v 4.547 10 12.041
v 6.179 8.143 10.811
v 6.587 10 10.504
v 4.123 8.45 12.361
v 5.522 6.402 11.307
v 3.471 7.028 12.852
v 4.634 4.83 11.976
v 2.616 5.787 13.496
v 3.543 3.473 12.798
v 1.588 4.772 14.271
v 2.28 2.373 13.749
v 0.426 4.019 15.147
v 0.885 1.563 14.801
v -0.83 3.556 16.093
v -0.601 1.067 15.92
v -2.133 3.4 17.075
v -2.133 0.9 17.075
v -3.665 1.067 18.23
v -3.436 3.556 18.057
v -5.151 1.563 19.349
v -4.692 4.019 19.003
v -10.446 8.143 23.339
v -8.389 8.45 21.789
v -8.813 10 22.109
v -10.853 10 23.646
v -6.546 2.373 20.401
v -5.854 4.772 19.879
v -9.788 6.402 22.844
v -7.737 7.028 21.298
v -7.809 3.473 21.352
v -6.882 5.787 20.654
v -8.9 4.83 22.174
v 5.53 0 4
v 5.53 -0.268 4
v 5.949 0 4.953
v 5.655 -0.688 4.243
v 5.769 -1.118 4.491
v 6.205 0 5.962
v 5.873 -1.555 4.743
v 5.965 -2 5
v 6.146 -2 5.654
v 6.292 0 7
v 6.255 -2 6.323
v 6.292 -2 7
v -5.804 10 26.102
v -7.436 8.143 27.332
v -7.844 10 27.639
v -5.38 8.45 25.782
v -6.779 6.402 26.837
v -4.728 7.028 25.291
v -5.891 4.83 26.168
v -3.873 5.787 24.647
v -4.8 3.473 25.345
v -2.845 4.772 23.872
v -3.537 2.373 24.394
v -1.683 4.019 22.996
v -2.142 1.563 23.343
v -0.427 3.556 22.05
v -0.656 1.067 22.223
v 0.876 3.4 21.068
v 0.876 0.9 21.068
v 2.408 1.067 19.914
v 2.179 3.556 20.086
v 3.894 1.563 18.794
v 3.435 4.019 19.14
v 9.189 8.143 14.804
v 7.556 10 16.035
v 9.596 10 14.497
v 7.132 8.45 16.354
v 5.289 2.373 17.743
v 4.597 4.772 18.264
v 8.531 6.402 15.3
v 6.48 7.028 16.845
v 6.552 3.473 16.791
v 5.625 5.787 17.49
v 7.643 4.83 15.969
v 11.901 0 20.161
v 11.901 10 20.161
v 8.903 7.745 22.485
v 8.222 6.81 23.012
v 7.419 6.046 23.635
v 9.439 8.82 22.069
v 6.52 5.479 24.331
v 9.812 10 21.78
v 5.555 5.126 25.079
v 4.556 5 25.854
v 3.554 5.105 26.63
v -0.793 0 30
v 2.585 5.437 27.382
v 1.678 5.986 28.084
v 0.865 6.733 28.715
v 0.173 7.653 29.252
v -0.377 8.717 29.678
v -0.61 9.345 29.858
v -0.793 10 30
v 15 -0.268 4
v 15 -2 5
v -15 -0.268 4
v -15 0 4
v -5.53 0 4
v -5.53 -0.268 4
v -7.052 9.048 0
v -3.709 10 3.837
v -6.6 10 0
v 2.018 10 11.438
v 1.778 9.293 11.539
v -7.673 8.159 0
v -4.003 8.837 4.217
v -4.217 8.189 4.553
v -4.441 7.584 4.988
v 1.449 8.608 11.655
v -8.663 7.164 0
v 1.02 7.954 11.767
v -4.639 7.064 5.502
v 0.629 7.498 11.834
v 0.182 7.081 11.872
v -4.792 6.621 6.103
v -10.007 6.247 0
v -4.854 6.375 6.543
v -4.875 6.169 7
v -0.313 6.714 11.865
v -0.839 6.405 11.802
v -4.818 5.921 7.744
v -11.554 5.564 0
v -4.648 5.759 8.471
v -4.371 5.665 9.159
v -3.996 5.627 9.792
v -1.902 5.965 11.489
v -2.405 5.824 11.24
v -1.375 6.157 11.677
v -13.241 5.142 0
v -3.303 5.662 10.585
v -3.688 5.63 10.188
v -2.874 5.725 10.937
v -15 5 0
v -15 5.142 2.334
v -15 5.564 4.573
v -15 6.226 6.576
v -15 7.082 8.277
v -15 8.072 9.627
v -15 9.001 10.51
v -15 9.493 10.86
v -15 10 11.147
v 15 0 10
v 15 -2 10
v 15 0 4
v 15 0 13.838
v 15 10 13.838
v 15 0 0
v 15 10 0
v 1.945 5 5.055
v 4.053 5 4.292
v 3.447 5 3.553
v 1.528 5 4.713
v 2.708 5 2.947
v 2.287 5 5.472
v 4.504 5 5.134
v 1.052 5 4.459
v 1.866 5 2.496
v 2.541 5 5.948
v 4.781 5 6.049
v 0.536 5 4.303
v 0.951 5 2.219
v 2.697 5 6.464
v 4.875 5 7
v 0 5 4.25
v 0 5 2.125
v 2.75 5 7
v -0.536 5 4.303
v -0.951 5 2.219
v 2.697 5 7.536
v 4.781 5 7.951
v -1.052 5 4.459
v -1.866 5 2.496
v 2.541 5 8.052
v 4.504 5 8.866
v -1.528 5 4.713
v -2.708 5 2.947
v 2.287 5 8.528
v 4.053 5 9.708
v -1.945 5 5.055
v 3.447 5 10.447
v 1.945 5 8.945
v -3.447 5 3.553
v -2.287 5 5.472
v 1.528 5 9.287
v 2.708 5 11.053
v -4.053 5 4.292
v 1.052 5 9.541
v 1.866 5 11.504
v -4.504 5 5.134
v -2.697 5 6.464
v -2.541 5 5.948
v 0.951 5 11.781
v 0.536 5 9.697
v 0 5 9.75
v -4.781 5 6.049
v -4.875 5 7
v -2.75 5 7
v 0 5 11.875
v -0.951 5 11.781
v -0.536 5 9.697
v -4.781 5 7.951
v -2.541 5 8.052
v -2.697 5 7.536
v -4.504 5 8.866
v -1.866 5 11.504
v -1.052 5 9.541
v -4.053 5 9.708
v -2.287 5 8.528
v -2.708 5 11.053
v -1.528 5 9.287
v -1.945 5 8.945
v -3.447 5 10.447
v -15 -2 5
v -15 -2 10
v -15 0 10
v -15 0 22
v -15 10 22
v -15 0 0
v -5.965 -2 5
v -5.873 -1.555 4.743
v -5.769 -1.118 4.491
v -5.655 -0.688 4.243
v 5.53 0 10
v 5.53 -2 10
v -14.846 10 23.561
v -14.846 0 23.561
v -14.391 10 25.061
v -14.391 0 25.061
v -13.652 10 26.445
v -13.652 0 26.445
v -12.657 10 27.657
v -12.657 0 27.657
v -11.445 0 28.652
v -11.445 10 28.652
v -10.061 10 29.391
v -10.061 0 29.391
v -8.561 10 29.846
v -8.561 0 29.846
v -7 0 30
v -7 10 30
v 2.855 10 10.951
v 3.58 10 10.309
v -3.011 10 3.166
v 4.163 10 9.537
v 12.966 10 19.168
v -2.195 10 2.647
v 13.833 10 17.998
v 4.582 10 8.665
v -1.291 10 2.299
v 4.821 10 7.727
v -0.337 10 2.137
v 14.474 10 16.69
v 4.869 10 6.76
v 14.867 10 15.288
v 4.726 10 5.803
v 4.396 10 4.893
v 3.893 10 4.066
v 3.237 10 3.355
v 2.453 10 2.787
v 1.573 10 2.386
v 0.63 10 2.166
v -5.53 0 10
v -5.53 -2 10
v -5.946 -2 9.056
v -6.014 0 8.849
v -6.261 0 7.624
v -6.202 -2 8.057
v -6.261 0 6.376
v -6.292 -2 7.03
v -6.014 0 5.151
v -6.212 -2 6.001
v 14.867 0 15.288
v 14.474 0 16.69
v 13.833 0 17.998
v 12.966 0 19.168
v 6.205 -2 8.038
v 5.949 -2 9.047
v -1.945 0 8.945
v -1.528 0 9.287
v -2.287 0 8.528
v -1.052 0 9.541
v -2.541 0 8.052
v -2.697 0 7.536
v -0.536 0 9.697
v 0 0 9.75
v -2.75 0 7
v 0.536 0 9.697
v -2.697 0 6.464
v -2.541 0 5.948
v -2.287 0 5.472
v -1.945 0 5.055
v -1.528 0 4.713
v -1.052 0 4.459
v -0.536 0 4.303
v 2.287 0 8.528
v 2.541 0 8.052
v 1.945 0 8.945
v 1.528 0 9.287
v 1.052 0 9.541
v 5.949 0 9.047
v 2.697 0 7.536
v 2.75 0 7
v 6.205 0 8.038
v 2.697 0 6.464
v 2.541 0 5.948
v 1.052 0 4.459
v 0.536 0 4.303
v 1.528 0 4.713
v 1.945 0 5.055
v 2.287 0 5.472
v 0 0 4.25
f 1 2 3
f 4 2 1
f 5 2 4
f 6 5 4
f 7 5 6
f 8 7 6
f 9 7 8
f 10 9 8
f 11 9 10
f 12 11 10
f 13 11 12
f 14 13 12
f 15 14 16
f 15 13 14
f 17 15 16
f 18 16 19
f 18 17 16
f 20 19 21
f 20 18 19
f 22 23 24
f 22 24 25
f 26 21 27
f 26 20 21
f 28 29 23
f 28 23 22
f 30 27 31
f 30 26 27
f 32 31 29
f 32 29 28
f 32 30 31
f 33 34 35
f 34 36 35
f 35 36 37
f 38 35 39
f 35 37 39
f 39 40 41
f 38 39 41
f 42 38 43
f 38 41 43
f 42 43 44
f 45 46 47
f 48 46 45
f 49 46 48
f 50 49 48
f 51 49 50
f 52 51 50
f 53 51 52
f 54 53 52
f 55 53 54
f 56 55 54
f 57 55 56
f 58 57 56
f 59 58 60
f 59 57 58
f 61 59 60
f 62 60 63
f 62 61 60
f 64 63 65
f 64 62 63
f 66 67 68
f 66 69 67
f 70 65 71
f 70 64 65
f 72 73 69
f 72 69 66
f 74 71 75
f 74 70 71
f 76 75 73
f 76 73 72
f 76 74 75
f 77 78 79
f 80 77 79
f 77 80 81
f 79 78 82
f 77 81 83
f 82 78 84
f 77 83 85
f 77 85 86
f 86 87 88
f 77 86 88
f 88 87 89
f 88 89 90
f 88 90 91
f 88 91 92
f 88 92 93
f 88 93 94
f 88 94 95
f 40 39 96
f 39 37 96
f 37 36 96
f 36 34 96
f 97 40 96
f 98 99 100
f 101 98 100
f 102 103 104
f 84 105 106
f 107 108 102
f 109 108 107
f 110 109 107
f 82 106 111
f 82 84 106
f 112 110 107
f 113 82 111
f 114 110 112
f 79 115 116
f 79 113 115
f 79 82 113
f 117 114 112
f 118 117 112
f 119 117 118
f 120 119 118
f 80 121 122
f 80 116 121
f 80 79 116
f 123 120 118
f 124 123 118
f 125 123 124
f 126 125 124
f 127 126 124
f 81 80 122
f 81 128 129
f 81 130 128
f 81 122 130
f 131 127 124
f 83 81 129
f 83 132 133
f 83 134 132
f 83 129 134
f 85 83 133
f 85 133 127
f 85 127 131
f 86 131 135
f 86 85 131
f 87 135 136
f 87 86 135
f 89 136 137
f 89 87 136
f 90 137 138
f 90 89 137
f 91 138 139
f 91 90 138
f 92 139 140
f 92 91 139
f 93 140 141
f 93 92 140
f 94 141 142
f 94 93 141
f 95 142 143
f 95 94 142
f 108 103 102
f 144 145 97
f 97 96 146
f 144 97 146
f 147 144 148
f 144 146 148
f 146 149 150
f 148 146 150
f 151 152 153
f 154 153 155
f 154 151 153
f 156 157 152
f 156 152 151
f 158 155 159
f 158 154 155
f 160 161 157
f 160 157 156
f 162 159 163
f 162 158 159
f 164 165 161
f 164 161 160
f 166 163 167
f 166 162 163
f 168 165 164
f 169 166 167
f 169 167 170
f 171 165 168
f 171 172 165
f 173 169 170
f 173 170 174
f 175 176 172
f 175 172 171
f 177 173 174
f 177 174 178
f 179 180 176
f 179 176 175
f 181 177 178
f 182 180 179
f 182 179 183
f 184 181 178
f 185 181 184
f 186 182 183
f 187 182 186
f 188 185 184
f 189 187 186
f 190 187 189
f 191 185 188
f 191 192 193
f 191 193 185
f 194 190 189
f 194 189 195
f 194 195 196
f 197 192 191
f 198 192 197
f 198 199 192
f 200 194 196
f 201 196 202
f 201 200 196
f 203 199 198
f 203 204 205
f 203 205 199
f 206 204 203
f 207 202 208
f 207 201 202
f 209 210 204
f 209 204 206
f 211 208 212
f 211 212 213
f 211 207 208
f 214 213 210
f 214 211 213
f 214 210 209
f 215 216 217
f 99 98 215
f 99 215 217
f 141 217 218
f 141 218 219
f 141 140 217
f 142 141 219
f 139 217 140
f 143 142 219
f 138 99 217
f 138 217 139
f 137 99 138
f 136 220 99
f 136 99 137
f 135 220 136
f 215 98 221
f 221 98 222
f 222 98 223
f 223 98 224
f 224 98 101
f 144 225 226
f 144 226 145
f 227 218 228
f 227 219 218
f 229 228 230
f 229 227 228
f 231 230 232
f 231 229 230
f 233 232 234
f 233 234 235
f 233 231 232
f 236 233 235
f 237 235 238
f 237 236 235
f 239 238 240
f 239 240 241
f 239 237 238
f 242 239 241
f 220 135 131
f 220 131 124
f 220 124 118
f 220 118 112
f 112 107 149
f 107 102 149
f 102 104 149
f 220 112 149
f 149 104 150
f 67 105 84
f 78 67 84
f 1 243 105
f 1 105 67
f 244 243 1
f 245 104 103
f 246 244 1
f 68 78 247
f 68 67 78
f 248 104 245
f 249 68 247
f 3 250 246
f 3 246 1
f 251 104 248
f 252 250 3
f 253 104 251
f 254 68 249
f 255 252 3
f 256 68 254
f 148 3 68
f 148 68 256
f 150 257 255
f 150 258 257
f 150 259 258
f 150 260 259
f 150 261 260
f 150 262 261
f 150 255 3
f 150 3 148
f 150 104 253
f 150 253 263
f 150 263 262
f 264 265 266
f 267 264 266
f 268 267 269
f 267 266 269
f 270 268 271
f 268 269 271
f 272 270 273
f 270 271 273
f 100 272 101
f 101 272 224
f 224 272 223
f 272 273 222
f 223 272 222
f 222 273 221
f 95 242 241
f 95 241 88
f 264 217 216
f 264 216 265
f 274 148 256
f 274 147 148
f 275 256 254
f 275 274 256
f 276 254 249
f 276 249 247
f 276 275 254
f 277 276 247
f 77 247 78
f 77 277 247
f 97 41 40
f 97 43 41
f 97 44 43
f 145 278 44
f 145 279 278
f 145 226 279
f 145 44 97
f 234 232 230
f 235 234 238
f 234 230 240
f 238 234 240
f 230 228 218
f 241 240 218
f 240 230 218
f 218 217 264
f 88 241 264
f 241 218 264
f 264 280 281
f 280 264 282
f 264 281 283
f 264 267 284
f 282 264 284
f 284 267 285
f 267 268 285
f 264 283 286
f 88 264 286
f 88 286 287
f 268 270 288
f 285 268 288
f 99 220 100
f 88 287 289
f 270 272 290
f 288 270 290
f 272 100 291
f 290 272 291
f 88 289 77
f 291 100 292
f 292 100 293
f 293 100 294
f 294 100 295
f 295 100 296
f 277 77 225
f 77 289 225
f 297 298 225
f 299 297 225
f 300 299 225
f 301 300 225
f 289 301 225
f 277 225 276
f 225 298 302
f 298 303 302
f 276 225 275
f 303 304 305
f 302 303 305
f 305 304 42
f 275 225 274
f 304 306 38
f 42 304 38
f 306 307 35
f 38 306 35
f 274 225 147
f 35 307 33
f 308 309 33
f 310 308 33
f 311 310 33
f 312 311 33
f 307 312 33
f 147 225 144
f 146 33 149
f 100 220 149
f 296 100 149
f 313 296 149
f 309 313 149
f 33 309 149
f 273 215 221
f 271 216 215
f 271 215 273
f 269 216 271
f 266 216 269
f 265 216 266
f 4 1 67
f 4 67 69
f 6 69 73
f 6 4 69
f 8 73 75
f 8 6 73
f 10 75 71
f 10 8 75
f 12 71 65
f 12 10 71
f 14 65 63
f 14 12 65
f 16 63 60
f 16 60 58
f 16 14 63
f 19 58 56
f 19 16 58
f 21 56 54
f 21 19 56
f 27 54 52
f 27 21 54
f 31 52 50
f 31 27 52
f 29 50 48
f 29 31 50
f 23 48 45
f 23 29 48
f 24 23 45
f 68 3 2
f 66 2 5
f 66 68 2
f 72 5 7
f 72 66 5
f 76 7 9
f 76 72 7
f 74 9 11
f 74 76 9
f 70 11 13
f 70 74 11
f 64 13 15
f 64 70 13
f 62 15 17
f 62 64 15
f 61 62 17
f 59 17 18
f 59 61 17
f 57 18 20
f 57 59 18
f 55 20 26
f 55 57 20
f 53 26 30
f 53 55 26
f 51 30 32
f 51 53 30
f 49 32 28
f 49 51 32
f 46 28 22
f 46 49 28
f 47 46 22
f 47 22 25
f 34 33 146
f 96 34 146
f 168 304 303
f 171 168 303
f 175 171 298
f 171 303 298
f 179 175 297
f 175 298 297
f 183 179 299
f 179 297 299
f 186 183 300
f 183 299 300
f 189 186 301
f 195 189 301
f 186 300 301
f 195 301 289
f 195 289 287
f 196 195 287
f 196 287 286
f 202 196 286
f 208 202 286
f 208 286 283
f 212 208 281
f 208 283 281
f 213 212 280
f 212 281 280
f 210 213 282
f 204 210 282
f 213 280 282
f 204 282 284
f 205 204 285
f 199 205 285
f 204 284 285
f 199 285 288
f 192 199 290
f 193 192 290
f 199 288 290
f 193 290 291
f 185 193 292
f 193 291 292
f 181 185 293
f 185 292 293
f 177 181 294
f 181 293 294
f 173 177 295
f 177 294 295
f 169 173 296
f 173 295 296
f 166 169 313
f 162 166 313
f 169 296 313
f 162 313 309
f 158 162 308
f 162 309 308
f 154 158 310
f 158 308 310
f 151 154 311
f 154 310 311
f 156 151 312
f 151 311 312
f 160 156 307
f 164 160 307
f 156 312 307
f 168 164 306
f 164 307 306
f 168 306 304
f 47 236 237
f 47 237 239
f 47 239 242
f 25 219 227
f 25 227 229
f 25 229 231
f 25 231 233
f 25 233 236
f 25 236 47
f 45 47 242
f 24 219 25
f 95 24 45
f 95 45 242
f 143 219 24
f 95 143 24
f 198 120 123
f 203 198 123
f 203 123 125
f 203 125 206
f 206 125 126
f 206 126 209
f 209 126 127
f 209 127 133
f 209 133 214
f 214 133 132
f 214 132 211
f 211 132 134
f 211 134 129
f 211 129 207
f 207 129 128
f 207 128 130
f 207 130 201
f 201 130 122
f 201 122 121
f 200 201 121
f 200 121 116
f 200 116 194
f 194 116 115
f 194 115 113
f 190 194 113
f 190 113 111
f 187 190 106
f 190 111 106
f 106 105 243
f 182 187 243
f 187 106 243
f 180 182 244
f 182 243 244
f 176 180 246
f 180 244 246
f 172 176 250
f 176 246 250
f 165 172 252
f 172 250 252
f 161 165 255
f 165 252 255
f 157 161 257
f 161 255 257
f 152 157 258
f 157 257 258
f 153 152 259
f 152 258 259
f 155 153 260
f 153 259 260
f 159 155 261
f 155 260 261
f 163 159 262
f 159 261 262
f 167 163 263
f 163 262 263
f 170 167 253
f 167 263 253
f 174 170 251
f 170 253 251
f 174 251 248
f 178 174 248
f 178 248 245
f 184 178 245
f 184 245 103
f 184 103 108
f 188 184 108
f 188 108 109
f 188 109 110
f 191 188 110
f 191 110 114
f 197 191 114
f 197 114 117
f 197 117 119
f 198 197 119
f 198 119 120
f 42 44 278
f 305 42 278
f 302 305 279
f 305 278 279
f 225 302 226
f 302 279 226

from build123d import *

# Parameters (mm, degrees)
F0_W            = 30
F0_H            = 10
F1_DEPTH        = 30
F6_DEPTH        = 25
F7_R            = 8
F8_W            = 30
F8_H            = 6
F9_DEPTH        = 2
F11_D           = 5.5
F11_DEPTH       = 100
F11_CBORE_D     = 9.75
F11_CBORE_DEPTH = 5
F11_TIP         = 1.6523667023
F12_R           = 2.75
F13_DEPTH       = 2
F14_SIZE2       = 1.7320508076
F14_SIZE        = 1
F14_2_SIZE2     = 1.7320508076
F14_2_SIZE      = 1


with BuildPart() as f1:
    # F0 (on Top) → F1 (new body)
    with BuildSketch(Plane.XY):
        with Locations((0, 5)):
            Rectangle(F0_W, F0_H)
    extrude(amount=F1_DEPTH)

    # F3 (on offset) → F4 (revolve, cut)
    with BuildSketch(Plane.XZ.offset(-12)):
        Polygon((16.9375651661, 30.751099481), (11.3471165957, 34.963804643), (-15.5656658205, -0.7506638978), (-9.9752172501, -4.9633690599), align=None)
        Polygon((9.7408888818, 14.3880629064), (7.7443001067, 15.8926004643), (4.7352249909, 11.8994229141), (6.7318137661, 10.3948853562), align=None)
    revolve(axis=Axis((-2.1092746124, 12, 17.1065703726), (-0.6018150232, 0, -0.79863551)), mode=Mode.SUBTRACT)

    # F5 (on offset) → F6 (intersect)
    with BuildSketch(Plane.XZ.offset(-12)):
        Polygon((3.6727298394, -14.6139401428), (23.5988721657, 11.0938824045), (-9.6680302551, 36.8790702076), (-29.5941725814, 11.1712476603), align=None)
    extrude(amount=F6_DEPTH, mode=Mode.INTERSECT)

    # F7
    f7_edges = [f1.edges().sort_by_distance(p)[0] for p in [
        (-15, 5, 30),
        (15, 5, 17.758871),
    ]]
    fillet(f7_edges, radius=F7_R)

    # F8 (on face) → F9 (join)
    with BuildSketch(Plane.XZ):
        with Locations((0, 7)):
            Rectangle(F8_W, F8_H)
    extrude(amount=F9_DEPTH)

    # F11
    with Locations(Plane(origin=(0, 10, 0), x_dir=(-1, 0, 0), z_dir=(0, 1, 0))):
        with Locations((0, 7)):
            CounterBoreHole(F11_D / 2, F11_CBORE_D / 2, F11_CBORE_DEPTH, depth=F11_DEPTH)
            with Locations((0, 0, -(F11_DEPTH + F11_TIP / 2))):  # 118° drill point
                Cone(0, F11_D / 2, F11_TIP, mode=Mode.SUBTRACT)

    # F12 (on face) → F13 (cut)
    with BuildSketch(Plane.XZ.offset(2)):
        with BuildLine():
            ThreePointArc((5.5302698775, 4), (6.0982775835, 5.4524550305), (6.2915725314, 7))
            ThreePointArc((6.2915725314, 7), (6.0982775835, 8.5475449695), (5.5302698775, 10))
            Line((5.5302698775, 10), (-5.5302698775, 10))
            ThreePointArc((-5.5302698775, 10), (-6.2915725314, 7), (-5.5302698775, 4))
            Line((-5.5302698775, 4), (5.5302698775, 4))
        make_face()
        with Locations((0, 7)):
            Circle(F12_R, mode=Mode.SUBTRACT)
    extrude(amount=-F13_DEPTH, mode=Mode.SUBTRACT)

    # F14
    f14_edges = [f1.edges().sort_by_distance(p)[0] for p in [
        (10.265135, -2, 4),
    ]]
    f14_side = f1.faces().sort_by_distance((10.51932, -2, 7))[0]
    chamfer(f14_edges, length=F14_SIZE, length2=F14_SIZE2, reference=f14_side)

    # F14#2
    f14_2_edges = [f1.edges().sort_by_distance(p)[0] for p in [
        (-10.265135, -2, 4),
    ]]
    f14_2_side = f1.faces().sort_by_distance((-10.51932, -2, 7))[0]
    chamfer(f14_2_edges, length=F14_2_SIZE, length2=F14_2_SIZE2, reference=f14_2_side)


solid = f1.part
